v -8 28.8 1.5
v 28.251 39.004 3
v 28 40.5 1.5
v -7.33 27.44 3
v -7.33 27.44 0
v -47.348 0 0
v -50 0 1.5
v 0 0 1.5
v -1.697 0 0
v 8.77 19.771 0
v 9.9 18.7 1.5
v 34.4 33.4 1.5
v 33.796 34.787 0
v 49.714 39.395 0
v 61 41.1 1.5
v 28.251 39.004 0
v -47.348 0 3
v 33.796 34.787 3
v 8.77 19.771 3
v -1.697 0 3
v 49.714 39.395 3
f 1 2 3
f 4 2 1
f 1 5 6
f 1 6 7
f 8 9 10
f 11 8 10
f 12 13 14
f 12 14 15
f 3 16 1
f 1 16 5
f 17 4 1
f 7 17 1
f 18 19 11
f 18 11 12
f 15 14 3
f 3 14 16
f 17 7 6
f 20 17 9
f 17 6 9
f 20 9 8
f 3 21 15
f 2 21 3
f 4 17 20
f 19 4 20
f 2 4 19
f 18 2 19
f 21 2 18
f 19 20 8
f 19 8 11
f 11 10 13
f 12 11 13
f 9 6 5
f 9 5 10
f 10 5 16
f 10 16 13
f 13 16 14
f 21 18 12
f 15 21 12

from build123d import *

# Parameters (mm, degrees)
F1_DEPTH = 3
F2_SIZE  = 1.49999


# Not quite as in the source:
# - a fillet or chamfer is up to 0.001 mm smaller than in the source, because OpenCascade refuses the exact size


with BuildPart() as f1:
    # F0 (on Top) → F1 (new body)
    with BuildSketch(Plane.XY):
        Polygon((-50, 0), (0, 0), (9.9, 18.7), (34.4, 33.4), (61, 41.1), (28, 40.5), (-8, 28.8), align=None)
    extrude(amount=F1_DEPTH)

    # F2 (size 1.5 in the source; OpenCascade refuses exactly that, so slightly less here)
    f2_edges = [f1.edges().sort_by_distance(p)[0] for p in [
        (-29, 14.4, 3),
        (10, 34.65, 3),
        (10, 34.65, 0),
        (-29, 14.4, 0),
        (44.5, 40.8, 0),
        (44.5, 40.8, 3),
        (47.7, 37.25, 3),
        (47.7, 37.25, 0),
        (22.15, 26.05, 3),
        (22.15, 26.05, 0),
        (4.95, 9.35, 3),
        (4.95, 9.35, 0),
    ]]
    chamfer(f2_edges, length=F2_SIZE)


solid = f1.part
